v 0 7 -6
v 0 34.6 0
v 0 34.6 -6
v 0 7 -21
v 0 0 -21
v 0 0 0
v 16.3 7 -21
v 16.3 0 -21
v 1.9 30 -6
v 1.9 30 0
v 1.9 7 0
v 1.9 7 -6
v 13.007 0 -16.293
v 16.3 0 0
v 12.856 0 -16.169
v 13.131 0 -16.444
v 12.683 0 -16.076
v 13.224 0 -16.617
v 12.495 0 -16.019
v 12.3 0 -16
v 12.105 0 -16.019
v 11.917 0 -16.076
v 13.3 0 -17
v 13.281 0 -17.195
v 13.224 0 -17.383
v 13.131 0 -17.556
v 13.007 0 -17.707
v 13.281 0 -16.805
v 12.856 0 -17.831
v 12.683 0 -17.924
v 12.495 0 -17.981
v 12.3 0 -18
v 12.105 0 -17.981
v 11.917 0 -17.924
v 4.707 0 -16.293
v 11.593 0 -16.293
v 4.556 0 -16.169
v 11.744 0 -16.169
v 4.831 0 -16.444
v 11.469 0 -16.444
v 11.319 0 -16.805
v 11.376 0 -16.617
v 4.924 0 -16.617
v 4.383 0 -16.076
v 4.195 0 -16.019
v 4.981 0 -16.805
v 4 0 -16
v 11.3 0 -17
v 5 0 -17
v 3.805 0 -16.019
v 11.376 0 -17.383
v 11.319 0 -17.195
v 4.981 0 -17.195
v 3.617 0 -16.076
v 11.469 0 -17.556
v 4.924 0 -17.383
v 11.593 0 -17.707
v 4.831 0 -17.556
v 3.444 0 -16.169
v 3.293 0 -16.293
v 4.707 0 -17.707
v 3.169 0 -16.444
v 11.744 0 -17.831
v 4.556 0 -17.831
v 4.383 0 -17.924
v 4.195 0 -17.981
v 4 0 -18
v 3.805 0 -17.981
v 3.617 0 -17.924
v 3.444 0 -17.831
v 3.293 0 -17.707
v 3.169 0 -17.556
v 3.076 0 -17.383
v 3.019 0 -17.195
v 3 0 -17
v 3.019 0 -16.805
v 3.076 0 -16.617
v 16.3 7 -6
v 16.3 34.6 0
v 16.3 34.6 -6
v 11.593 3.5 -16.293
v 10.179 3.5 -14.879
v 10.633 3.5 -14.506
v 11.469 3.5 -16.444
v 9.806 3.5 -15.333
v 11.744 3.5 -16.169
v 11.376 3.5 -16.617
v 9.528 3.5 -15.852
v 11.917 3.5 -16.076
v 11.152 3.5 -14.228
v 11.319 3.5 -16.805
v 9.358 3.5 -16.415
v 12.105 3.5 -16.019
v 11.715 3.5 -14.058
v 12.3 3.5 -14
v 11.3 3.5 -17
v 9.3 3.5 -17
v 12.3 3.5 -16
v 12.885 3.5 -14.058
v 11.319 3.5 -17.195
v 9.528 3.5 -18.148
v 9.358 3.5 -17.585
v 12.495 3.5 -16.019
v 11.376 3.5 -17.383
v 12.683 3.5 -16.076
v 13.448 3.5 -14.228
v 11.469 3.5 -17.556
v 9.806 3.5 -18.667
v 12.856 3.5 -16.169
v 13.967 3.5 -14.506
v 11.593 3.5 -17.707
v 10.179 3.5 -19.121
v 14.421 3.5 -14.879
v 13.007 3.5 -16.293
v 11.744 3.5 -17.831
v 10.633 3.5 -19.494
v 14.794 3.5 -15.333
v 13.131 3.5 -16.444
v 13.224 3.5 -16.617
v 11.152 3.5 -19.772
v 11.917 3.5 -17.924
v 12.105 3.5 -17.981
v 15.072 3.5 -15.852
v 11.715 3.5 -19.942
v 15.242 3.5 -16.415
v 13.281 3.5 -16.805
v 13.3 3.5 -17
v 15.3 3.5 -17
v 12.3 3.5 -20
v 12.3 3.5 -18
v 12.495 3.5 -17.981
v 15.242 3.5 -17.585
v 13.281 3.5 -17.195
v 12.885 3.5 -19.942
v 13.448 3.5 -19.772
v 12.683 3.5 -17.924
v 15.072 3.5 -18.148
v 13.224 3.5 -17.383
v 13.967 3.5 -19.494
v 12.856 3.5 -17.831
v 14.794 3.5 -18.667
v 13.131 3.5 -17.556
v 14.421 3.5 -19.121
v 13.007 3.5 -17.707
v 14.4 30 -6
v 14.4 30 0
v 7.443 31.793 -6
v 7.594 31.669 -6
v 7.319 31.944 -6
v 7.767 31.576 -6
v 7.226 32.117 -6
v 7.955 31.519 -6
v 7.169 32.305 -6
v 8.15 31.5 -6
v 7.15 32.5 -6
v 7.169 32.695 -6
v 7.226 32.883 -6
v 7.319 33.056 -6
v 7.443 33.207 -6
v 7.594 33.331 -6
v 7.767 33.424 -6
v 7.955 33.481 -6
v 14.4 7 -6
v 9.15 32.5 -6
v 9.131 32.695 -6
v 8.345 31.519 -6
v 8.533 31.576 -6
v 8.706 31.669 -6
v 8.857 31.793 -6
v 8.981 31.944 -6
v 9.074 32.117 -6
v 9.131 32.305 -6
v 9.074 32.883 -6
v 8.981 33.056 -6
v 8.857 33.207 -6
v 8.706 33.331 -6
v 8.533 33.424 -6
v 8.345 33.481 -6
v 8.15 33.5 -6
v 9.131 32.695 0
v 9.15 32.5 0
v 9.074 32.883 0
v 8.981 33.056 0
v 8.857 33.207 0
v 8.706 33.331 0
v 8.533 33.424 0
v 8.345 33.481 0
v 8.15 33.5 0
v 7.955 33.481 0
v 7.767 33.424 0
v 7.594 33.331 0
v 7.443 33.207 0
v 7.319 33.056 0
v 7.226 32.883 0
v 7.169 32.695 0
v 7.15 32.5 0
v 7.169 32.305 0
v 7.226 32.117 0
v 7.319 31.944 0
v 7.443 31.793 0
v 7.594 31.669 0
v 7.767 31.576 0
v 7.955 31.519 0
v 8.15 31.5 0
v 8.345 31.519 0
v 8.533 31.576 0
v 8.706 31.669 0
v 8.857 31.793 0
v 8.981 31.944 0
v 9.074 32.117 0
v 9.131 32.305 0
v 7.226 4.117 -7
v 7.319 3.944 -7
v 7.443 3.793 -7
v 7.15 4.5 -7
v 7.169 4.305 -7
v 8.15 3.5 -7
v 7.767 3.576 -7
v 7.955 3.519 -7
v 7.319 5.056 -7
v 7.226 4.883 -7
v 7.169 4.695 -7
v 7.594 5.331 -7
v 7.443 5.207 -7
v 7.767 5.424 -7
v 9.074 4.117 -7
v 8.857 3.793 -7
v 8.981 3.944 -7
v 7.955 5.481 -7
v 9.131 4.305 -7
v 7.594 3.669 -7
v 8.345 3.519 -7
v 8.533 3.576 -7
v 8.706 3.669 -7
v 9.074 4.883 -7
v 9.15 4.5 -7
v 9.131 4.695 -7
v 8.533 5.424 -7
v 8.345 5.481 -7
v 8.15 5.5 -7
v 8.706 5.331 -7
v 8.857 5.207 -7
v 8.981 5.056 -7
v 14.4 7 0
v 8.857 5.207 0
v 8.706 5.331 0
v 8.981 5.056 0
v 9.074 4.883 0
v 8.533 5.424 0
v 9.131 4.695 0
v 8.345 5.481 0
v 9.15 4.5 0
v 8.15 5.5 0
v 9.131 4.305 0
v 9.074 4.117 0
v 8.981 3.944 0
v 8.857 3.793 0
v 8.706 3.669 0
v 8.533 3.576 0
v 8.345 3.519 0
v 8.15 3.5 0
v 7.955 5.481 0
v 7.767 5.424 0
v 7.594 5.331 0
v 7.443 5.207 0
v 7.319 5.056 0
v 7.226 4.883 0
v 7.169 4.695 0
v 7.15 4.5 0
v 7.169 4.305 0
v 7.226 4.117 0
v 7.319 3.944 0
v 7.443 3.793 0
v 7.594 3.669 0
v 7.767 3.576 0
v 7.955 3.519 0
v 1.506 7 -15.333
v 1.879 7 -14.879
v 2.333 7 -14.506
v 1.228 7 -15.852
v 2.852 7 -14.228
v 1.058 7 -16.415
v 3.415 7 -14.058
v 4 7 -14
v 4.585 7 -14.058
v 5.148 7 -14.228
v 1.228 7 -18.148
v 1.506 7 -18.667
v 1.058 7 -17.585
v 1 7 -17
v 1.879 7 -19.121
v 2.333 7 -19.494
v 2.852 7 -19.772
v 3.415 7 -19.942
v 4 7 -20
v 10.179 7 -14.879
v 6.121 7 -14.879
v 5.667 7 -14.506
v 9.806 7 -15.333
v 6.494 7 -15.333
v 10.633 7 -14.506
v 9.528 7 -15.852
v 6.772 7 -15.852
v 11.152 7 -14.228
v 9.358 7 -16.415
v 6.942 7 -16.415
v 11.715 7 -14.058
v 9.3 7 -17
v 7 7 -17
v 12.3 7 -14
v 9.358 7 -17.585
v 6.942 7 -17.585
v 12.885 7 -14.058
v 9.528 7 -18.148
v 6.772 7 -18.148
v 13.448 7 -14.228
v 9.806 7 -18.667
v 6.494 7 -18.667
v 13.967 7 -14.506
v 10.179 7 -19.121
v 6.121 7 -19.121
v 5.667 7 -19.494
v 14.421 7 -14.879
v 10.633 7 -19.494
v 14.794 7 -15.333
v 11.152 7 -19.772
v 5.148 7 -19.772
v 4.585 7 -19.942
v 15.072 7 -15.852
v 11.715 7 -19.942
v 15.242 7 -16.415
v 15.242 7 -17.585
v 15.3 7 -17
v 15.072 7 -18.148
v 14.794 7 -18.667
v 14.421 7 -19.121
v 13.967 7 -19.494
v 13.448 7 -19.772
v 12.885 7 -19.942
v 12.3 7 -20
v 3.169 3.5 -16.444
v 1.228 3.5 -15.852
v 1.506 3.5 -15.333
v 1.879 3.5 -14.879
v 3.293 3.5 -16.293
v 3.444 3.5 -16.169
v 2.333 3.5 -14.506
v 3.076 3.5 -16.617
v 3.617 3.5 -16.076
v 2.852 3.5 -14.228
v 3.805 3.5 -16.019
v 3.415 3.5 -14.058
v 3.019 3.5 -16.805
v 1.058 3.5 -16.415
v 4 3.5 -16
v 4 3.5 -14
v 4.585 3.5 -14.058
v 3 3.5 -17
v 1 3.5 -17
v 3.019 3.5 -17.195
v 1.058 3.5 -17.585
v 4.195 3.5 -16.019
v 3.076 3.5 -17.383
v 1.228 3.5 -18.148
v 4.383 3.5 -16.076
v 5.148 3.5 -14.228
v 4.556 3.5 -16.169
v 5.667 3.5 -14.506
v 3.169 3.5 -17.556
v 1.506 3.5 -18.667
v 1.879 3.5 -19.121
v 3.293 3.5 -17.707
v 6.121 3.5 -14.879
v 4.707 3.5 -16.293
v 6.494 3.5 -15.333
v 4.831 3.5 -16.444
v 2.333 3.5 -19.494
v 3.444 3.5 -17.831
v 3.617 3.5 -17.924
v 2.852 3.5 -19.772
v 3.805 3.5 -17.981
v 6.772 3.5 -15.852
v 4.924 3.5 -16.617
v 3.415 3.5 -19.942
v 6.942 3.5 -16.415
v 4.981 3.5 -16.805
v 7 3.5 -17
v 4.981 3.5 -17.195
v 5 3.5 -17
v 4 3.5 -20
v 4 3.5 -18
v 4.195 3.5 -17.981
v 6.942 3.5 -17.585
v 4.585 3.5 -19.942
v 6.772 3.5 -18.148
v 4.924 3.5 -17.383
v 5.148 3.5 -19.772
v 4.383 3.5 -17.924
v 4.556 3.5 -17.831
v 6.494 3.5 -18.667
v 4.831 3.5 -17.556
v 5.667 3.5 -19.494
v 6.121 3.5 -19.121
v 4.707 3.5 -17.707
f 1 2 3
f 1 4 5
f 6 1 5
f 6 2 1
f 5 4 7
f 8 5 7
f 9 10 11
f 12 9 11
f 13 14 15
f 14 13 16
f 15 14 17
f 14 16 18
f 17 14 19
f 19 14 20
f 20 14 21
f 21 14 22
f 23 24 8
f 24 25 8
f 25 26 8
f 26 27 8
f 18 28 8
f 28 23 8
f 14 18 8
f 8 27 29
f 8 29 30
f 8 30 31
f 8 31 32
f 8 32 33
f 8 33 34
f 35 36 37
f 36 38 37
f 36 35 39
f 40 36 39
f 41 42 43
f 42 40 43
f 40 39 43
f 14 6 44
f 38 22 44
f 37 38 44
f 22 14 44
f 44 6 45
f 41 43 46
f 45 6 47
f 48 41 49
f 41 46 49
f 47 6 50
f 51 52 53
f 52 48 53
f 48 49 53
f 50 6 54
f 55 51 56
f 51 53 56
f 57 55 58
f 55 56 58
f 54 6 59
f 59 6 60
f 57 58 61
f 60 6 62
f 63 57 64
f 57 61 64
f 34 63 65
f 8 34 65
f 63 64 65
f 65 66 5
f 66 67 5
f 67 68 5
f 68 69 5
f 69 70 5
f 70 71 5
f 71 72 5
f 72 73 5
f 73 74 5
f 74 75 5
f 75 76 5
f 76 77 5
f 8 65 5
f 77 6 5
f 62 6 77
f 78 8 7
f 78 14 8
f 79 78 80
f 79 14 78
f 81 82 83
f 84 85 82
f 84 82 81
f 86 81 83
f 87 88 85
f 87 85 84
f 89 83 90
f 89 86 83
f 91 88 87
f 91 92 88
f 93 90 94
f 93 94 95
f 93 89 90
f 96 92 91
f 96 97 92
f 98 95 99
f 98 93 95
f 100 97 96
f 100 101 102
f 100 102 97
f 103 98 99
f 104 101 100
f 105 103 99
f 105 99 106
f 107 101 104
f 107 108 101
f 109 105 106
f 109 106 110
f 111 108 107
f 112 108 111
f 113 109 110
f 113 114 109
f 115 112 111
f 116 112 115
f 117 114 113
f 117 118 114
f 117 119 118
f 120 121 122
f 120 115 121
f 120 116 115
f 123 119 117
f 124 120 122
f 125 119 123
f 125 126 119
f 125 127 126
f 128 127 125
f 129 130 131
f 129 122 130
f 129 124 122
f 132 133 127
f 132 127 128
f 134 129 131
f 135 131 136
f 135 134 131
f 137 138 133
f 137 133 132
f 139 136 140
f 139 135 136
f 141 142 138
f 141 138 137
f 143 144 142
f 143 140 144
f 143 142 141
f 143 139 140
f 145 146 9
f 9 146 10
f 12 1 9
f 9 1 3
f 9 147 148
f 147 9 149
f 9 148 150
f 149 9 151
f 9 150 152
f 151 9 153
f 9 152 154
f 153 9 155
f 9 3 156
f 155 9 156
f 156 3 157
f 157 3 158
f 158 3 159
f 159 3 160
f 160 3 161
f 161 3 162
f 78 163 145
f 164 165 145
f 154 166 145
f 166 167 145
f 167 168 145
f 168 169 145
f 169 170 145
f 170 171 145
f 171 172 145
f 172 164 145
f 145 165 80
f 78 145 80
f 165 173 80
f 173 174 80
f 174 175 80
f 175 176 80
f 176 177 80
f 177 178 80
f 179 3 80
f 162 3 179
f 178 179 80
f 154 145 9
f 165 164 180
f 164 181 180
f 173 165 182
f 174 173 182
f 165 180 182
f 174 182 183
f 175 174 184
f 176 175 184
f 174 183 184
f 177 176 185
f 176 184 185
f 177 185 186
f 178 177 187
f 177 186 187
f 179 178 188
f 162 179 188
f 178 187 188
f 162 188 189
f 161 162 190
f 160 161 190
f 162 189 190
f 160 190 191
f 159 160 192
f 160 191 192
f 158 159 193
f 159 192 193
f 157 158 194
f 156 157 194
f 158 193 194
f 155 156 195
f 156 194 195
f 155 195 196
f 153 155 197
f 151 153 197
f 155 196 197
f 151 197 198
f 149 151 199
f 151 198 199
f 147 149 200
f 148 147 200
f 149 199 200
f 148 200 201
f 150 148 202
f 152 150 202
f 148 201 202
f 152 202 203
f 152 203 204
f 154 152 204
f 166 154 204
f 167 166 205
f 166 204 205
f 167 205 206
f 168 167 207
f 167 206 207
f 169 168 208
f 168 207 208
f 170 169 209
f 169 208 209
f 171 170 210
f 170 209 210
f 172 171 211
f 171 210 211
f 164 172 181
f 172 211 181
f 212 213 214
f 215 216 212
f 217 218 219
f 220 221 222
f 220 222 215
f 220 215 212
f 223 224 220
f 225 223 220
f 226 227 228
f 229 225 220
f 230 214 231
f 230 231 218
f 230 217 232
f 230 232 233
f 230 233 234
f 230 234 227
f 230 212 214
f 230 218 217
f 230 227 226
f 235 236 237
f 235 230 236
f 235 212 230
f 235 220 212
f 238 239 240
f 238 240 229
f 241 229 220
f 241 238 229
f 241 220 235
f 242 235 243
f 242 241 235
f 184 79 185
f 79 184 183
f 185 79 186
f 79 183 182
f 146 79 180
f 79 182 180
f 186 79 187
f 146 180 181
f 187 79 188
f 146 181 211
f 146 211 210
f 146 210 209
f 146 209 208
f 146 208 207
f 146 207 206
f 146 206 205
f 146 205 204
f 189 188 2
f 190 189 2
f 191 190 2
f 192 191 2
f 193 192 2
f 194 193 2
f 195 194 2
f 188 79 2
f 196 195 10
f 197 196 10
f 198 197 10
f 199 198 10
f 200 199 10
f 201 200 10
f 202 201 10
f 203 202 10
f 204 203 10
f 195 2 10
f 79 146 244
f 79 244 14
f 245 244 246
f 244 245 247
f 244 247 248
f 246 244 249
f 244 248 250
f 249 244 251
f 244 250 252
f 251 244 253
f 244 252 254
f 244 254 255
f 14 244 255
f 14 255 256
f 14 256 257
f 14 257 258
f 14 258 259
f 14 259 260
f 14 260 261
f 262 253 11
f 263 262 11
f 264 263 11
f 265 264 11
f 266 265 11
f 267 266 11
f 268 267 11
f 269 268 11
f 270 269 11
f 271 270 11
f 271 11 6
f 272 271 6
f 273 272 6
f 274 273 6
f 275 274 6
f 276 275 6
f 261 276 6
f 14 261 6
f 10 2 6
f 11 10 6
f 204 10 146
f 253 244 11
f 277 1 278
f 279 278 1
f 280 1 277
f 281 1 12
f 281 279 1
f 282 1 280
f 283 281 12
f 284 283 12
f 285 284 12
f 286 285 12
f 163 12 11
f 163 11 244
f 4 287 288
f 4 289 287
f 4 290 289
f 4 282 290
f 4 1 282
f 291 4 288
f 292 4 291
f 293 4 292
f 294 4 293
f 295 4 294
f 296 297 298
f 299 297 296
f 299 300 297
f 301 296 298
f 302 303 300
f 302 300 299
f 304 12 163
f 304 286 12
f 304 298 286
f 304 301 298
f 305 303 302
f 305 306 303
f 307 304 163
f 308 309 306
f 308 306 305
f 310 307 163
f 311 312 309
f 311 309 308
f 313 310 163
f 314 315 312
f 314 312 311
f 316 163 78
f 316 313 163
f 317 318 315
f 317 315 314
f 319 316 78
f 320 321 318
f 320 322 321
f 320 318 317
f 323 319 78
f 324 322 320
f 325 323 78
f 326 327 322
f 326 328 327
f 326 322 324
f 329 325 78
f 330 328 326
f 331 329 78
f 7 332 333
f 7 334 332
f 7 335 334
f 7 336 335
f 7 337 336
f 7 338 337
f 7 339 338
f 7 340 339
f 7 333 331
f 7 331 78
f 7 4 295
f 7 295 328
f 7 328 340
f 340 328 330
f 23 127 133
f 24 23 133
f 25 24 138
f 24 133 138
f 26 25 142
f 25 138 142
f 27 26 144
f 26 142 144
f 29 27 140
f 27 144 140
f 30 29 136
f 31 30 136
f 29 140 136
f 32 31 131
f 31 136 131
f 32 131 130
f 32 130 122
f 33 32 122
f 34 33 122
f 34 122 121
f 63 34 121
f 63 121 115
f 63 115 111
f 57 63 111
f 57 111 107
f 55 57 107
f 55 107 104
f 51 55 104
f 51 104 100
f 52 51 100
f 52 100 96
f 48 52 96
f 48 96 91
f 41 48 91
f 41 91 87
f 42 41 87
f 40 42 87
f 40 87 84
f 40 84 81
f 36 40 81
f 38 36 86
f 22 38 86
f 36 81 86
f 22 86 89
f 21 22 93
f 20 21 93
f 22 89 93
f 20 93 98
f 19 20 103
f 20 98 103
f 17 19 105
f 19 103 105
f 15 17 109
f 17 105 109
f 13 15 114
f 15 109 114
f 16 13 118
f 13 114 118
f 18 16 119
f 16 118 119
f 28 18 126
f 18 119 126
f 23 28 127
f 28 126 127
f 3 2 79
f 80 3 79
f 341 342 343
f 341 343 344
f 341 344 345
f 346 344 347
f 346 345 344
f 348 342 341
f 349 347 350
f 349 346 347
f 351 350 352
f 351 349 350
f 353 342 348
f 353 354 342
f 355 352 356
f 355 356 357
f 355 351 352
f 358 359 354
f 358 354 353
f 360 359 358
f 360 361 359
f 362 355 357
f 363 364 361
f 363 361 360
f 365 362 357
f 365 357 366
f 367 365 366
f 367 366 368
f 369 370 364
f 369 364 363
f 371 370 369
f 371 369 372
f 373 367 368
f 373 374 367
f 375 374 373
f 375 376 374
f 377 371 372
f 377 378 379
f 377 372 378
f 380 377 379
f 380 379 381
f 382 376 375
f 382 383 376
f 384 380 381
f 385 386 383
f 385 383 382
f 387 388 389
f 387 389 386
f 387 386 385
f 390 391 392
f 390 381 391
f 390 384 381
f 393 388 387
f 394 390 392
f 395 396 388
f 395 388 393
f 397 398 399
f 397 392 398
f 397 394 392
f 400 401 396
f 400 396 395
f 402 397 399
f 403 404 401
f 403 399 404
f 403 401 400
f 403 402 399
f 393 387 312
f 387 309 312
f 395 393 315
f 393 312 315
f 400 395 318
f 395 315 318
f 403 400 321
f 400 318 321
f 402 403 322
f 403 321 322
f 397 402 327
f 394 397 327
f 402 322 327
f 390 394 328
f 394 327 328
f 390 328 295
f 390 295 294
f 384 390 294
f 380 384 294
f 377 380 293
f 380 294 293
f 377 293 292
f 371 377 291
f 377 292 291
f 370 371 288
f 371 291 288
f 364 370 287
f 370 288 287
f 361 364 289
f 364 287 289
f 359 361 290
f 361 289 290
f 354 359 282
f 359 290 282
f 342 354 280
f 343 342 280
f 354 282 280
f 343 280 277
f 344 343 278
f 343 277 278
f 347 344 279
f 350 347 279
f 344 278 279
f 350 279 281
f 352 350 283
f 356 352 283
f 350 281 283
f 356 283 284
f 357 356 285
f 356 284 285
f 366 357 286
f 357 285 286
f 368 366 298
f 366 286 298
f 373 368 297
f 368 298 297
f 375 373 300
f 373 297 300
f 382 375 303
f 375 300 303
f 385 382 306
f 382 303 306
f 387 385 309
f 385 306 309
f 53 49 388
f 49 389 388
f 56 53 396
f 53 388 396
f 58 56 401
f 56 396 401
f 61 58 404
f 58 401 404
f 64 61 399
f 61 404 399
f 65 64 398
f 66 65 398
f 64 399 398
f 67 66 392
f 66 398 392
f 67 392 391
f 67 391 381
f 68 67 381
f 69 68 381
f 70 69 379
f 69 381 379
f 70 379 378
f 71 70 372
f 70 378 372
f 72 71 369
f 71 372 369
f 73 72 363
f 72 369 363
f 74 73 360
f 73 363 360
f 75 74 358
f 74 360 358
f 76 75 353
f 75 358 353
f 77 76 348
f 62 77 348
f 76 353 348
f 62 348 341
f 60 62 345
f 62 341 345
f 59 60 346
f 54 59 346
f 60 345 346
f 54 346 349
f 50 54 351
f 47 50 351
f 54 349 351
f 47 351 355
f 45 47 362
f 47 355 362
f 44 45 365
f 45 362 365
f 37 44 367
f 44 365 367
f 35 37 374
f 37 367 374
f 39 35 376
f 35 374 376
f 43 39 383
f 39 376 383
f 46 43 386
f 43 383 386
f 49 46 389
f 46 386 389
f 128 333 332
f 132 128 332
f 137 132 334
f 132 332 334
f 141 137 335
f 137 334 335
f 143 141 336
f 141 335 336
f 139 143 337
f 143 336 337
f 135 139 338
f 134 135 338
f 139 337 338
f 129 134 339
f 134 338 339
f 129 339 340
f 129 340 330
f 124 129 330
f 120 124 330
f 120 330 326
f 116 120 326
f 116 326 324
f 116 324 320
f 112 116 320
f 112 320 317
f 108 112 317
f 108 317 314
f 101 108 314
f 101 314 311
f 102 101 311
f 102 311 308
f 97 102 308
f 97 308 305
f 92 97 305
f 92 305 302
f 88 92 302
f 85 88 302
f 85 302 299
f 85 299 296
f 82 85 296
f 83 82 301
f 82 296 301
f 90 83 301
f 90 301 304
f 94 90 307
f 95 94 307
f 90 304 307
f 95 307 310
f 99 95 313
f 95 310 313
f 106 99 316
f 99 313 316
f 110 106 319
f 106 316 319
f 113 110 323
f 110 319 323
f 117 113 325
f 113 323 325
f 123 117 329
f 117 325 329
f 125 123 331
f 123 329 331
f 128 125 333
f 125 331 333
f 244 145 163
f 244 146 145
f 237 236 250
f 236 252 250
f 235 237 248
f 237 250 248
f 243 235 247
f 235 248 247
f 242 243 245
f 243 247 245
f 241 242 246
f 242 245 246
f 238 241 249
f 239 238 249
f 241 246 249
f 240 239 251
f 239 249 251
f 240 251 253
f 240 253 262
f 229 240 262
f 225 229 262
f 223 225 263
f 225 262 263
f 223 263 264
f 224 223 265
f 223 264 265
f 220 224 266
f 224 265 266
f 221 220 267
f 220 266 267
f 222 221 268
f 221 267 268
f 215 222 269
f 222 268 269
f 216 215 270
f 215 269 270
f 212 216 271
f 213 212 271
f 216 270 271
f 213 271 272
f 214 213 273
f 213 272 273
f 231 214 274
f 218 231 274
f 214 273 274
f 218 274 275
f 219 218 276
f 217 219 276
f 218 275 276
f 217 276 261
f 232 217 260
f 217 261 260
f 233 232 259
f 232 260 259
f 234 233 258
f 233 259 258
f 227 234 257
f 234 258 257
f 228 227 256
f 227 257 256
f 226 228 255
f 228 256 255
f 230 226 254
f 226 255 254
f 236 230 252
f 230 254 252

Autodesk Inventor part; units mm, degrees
ref_plane "YZ Plane" through (0, 0, 0) normal (1, 0, 0) x (0, 1, 0)
ref_plane "XZ Plane" through (0, 0, 0) normal (0, 1, 0) x (-1, 0, 0)
ref_plane "XY Plane" through (0, 0, 0) normal (0, 0, 1) x (1, 0, 0)
sketch "Sketch1" plane through (0, 0, 0) normal (1, 0, 0) x (0, 1, 0)
  line L0 (34.6, 0) -> (0, 0)
  line L1 (0, 0) -> (0, -40)
  line L2 (7, -40) -> (7, -5)
  line L3 (7, -5) -> (34.6, -5)
  line L4 (34.6, -5) -> (34.6, 0)
  line L5 (7, -40) -> (0, -40)
  dimension "d0" = 0
  dimension "d1" = 0
  dimension "d2" = 5
  dimension "d3" = 7
  dimension "d5" = 40
  dimension "d6" = 34.6
extrude "Extrusion1" add sketch "Sketch1" along normal blind 16.3
sketch "Sketch2" plane through (0, 7, -5) normal (0, 1, 0) x (1, 0, 0)
  line L0 (16.3, 35) -> (16.3, 0) projected
  line L1 (0, -5) -> (16.3, -5) projected
  circle A0 centre (12.3, 12) radius 1
  line L2 (12.3, 5) -> (12.3, 12) construction
  circle A1 centre (4, 12) radius 1
  line L3 (0, 35) -> (0, 0) projected
  line L4 (0, 0) -> (16.3, 0) projected
  dimension "d9" = 4
  dimension "d31" = 2
  dimension "d46" = 4
  dimension "d47" = 12
  dimension "d48" = 0
extrude "Extrusion2" cut sketch "Sketch2" against normal through all
sketch "Sketch3" plane through (0, 7, -5) normal (0, 0, -1) x (-1, 0, 0)
  line L0 (0, 0) -> (-16.3, 0) projected
  line L1 (-14.4, 0) -> (-1.9, 0)
  line L2 (-1.9, 0) -> (-1.9, 23)
  line L3 (-1.9, 23) -> (-14.4, 23)
  line L4 (-14.4, 23) -> (-14.4, 0)
  line L5 (0, 0) -> (0, 27.6) projected
  point P0 (0, -7)
  dimension "d14" = 23
  dimension "d15" = 12.5
  dimension "d16" = 1.9
extrude "Extrusion3" cut sketch "Sketch3" against normal blind 16.3
sketch "Sketch5" plane through (0, 7, -5) normal (0, 0, -1) x (-1, 0, 0)
  line L0 (0, 27.6) -> (-16.3, 27.6) projected
  line L1 (-16.3, 27.6) -> (0, 27.6)
  line L2 (0, 27.6) -> (0, 0)
  line L3 (0, 0) -> (-1.9, 0)
  line L4 (-14.4, 23) -> (-14.4, 0) projected
  line L5 (-14.4, 23) -> (-14.4, 0)
  line L6 (-14.4, 0) -> (-16.3, 0)
  line L7 (-16.3, 0) -> (-16.3, 27.6)
  line L8 (-14.4, 23) -> (-1.9, 23)
  line L9 (-1.9, 23) -> (-1.9, 0)
  line L10 (-1.9, 23) -> (-1.9, 0) projected
  line L11 (-14.4, 23) -> (-1.9, 23) projected
  point P0 (0, -7)
  dimension "d26" = 0
  dimension "d27" = 0
  dimension "d28" = 1.9
extrude "Extrusion5" add sketch "Sketch5" along normal blind 4
sketch "Sketch4" plane through (0, 0, 0) normal (0, 0, 1) x (1, 0, 0)
  circle A0 centre (8.15, 32.5) radius 1
  circle A1 centre (8.15, 4.5) radius 1
  line L0 (1.9, 30) -> (14.4, 30) projected
  line L1 (14.4, 7) -> (1.9, 7) projected
  line L2 (0, 34.6) -> (0, 0) projected
  line L3 (16.3, 34.6) -> (16.3, 0) projected
  dimension "d19" = 2.5
  dimension "d20" = 2.5
  dimension "d21" = 2
  dimension "d22" = 8.15
  dimension "d23" = 8.15
extrude "Extrusion4" cut sketch "Sketch4" against normal blind 7
sketch "Sketch7" plane through (0, 34.6, 0) normal (0, 1, 0) x (1, 0, 0)
  line L0 (16.3, 0) -> (16.3, 9) projected
  line L1 (0, 0) -> (0, 9) projected
  line L2 (16.3, 9) -> (0, 9)
  line L3 (0, 9) -> (0, 6)
  line L4 (0, 6) -> (16.3, 6)
  line L5 (16.3, 6) -> (16.3, 9)
  line L6 (0, 0) -> (16.3, 0) projected
  dimension "d40" = 6
extrude "Extrusion7" cut sketch "Sketch7" against normal up to surface (27.6 mm away) contours L4 L1 L2 L0
sketch "Sketch8" plane through (0, 7, -40) normal (0, 1, 0) x (1, 0, 0)
  line L0 (0, 0) -> (16.3, 0) projected
  line L1 (0, 0) -> (0, -34) projected
  line L2 (16.3, 0) -> (0, 0)
  line L3 (0, 0) -> (0, -19)
  line L4 (0, -19) -> (16.3, -19)
  line L5 (16.3, -19) -> (16.3, 0)
  circle A0 centre (12.3, -23) radius 1 projected
  point P0 (0, -40)
  dimension "d43" = 4
extrude "Extrusion8" cut sketch "Sketch8" against normal blind 10 contours L0 L5 L4 L1
sketch "Sketch9" plane through (1.9, 7, 0) normal (0, 1, 0) x (1, 0, 0)
  circle A0 centre (2.1, 17) radius 1 projected
  circle A1 centre (10.4, 17) radius 1 projected
  circle A2 centre (2.1, 17) radius 3
  circle A3 centre (10.4, 17) radius 3
  point P0 (-1.9, 0)
  dimension "d49" = 6
  dimension "d50" = 6
extrude "Extrusion9" cut sketch "Sketch9" against normal blind 3.5
equation "\"d50\" = d49"
properties part number "ServoHolder_3DPrint"
